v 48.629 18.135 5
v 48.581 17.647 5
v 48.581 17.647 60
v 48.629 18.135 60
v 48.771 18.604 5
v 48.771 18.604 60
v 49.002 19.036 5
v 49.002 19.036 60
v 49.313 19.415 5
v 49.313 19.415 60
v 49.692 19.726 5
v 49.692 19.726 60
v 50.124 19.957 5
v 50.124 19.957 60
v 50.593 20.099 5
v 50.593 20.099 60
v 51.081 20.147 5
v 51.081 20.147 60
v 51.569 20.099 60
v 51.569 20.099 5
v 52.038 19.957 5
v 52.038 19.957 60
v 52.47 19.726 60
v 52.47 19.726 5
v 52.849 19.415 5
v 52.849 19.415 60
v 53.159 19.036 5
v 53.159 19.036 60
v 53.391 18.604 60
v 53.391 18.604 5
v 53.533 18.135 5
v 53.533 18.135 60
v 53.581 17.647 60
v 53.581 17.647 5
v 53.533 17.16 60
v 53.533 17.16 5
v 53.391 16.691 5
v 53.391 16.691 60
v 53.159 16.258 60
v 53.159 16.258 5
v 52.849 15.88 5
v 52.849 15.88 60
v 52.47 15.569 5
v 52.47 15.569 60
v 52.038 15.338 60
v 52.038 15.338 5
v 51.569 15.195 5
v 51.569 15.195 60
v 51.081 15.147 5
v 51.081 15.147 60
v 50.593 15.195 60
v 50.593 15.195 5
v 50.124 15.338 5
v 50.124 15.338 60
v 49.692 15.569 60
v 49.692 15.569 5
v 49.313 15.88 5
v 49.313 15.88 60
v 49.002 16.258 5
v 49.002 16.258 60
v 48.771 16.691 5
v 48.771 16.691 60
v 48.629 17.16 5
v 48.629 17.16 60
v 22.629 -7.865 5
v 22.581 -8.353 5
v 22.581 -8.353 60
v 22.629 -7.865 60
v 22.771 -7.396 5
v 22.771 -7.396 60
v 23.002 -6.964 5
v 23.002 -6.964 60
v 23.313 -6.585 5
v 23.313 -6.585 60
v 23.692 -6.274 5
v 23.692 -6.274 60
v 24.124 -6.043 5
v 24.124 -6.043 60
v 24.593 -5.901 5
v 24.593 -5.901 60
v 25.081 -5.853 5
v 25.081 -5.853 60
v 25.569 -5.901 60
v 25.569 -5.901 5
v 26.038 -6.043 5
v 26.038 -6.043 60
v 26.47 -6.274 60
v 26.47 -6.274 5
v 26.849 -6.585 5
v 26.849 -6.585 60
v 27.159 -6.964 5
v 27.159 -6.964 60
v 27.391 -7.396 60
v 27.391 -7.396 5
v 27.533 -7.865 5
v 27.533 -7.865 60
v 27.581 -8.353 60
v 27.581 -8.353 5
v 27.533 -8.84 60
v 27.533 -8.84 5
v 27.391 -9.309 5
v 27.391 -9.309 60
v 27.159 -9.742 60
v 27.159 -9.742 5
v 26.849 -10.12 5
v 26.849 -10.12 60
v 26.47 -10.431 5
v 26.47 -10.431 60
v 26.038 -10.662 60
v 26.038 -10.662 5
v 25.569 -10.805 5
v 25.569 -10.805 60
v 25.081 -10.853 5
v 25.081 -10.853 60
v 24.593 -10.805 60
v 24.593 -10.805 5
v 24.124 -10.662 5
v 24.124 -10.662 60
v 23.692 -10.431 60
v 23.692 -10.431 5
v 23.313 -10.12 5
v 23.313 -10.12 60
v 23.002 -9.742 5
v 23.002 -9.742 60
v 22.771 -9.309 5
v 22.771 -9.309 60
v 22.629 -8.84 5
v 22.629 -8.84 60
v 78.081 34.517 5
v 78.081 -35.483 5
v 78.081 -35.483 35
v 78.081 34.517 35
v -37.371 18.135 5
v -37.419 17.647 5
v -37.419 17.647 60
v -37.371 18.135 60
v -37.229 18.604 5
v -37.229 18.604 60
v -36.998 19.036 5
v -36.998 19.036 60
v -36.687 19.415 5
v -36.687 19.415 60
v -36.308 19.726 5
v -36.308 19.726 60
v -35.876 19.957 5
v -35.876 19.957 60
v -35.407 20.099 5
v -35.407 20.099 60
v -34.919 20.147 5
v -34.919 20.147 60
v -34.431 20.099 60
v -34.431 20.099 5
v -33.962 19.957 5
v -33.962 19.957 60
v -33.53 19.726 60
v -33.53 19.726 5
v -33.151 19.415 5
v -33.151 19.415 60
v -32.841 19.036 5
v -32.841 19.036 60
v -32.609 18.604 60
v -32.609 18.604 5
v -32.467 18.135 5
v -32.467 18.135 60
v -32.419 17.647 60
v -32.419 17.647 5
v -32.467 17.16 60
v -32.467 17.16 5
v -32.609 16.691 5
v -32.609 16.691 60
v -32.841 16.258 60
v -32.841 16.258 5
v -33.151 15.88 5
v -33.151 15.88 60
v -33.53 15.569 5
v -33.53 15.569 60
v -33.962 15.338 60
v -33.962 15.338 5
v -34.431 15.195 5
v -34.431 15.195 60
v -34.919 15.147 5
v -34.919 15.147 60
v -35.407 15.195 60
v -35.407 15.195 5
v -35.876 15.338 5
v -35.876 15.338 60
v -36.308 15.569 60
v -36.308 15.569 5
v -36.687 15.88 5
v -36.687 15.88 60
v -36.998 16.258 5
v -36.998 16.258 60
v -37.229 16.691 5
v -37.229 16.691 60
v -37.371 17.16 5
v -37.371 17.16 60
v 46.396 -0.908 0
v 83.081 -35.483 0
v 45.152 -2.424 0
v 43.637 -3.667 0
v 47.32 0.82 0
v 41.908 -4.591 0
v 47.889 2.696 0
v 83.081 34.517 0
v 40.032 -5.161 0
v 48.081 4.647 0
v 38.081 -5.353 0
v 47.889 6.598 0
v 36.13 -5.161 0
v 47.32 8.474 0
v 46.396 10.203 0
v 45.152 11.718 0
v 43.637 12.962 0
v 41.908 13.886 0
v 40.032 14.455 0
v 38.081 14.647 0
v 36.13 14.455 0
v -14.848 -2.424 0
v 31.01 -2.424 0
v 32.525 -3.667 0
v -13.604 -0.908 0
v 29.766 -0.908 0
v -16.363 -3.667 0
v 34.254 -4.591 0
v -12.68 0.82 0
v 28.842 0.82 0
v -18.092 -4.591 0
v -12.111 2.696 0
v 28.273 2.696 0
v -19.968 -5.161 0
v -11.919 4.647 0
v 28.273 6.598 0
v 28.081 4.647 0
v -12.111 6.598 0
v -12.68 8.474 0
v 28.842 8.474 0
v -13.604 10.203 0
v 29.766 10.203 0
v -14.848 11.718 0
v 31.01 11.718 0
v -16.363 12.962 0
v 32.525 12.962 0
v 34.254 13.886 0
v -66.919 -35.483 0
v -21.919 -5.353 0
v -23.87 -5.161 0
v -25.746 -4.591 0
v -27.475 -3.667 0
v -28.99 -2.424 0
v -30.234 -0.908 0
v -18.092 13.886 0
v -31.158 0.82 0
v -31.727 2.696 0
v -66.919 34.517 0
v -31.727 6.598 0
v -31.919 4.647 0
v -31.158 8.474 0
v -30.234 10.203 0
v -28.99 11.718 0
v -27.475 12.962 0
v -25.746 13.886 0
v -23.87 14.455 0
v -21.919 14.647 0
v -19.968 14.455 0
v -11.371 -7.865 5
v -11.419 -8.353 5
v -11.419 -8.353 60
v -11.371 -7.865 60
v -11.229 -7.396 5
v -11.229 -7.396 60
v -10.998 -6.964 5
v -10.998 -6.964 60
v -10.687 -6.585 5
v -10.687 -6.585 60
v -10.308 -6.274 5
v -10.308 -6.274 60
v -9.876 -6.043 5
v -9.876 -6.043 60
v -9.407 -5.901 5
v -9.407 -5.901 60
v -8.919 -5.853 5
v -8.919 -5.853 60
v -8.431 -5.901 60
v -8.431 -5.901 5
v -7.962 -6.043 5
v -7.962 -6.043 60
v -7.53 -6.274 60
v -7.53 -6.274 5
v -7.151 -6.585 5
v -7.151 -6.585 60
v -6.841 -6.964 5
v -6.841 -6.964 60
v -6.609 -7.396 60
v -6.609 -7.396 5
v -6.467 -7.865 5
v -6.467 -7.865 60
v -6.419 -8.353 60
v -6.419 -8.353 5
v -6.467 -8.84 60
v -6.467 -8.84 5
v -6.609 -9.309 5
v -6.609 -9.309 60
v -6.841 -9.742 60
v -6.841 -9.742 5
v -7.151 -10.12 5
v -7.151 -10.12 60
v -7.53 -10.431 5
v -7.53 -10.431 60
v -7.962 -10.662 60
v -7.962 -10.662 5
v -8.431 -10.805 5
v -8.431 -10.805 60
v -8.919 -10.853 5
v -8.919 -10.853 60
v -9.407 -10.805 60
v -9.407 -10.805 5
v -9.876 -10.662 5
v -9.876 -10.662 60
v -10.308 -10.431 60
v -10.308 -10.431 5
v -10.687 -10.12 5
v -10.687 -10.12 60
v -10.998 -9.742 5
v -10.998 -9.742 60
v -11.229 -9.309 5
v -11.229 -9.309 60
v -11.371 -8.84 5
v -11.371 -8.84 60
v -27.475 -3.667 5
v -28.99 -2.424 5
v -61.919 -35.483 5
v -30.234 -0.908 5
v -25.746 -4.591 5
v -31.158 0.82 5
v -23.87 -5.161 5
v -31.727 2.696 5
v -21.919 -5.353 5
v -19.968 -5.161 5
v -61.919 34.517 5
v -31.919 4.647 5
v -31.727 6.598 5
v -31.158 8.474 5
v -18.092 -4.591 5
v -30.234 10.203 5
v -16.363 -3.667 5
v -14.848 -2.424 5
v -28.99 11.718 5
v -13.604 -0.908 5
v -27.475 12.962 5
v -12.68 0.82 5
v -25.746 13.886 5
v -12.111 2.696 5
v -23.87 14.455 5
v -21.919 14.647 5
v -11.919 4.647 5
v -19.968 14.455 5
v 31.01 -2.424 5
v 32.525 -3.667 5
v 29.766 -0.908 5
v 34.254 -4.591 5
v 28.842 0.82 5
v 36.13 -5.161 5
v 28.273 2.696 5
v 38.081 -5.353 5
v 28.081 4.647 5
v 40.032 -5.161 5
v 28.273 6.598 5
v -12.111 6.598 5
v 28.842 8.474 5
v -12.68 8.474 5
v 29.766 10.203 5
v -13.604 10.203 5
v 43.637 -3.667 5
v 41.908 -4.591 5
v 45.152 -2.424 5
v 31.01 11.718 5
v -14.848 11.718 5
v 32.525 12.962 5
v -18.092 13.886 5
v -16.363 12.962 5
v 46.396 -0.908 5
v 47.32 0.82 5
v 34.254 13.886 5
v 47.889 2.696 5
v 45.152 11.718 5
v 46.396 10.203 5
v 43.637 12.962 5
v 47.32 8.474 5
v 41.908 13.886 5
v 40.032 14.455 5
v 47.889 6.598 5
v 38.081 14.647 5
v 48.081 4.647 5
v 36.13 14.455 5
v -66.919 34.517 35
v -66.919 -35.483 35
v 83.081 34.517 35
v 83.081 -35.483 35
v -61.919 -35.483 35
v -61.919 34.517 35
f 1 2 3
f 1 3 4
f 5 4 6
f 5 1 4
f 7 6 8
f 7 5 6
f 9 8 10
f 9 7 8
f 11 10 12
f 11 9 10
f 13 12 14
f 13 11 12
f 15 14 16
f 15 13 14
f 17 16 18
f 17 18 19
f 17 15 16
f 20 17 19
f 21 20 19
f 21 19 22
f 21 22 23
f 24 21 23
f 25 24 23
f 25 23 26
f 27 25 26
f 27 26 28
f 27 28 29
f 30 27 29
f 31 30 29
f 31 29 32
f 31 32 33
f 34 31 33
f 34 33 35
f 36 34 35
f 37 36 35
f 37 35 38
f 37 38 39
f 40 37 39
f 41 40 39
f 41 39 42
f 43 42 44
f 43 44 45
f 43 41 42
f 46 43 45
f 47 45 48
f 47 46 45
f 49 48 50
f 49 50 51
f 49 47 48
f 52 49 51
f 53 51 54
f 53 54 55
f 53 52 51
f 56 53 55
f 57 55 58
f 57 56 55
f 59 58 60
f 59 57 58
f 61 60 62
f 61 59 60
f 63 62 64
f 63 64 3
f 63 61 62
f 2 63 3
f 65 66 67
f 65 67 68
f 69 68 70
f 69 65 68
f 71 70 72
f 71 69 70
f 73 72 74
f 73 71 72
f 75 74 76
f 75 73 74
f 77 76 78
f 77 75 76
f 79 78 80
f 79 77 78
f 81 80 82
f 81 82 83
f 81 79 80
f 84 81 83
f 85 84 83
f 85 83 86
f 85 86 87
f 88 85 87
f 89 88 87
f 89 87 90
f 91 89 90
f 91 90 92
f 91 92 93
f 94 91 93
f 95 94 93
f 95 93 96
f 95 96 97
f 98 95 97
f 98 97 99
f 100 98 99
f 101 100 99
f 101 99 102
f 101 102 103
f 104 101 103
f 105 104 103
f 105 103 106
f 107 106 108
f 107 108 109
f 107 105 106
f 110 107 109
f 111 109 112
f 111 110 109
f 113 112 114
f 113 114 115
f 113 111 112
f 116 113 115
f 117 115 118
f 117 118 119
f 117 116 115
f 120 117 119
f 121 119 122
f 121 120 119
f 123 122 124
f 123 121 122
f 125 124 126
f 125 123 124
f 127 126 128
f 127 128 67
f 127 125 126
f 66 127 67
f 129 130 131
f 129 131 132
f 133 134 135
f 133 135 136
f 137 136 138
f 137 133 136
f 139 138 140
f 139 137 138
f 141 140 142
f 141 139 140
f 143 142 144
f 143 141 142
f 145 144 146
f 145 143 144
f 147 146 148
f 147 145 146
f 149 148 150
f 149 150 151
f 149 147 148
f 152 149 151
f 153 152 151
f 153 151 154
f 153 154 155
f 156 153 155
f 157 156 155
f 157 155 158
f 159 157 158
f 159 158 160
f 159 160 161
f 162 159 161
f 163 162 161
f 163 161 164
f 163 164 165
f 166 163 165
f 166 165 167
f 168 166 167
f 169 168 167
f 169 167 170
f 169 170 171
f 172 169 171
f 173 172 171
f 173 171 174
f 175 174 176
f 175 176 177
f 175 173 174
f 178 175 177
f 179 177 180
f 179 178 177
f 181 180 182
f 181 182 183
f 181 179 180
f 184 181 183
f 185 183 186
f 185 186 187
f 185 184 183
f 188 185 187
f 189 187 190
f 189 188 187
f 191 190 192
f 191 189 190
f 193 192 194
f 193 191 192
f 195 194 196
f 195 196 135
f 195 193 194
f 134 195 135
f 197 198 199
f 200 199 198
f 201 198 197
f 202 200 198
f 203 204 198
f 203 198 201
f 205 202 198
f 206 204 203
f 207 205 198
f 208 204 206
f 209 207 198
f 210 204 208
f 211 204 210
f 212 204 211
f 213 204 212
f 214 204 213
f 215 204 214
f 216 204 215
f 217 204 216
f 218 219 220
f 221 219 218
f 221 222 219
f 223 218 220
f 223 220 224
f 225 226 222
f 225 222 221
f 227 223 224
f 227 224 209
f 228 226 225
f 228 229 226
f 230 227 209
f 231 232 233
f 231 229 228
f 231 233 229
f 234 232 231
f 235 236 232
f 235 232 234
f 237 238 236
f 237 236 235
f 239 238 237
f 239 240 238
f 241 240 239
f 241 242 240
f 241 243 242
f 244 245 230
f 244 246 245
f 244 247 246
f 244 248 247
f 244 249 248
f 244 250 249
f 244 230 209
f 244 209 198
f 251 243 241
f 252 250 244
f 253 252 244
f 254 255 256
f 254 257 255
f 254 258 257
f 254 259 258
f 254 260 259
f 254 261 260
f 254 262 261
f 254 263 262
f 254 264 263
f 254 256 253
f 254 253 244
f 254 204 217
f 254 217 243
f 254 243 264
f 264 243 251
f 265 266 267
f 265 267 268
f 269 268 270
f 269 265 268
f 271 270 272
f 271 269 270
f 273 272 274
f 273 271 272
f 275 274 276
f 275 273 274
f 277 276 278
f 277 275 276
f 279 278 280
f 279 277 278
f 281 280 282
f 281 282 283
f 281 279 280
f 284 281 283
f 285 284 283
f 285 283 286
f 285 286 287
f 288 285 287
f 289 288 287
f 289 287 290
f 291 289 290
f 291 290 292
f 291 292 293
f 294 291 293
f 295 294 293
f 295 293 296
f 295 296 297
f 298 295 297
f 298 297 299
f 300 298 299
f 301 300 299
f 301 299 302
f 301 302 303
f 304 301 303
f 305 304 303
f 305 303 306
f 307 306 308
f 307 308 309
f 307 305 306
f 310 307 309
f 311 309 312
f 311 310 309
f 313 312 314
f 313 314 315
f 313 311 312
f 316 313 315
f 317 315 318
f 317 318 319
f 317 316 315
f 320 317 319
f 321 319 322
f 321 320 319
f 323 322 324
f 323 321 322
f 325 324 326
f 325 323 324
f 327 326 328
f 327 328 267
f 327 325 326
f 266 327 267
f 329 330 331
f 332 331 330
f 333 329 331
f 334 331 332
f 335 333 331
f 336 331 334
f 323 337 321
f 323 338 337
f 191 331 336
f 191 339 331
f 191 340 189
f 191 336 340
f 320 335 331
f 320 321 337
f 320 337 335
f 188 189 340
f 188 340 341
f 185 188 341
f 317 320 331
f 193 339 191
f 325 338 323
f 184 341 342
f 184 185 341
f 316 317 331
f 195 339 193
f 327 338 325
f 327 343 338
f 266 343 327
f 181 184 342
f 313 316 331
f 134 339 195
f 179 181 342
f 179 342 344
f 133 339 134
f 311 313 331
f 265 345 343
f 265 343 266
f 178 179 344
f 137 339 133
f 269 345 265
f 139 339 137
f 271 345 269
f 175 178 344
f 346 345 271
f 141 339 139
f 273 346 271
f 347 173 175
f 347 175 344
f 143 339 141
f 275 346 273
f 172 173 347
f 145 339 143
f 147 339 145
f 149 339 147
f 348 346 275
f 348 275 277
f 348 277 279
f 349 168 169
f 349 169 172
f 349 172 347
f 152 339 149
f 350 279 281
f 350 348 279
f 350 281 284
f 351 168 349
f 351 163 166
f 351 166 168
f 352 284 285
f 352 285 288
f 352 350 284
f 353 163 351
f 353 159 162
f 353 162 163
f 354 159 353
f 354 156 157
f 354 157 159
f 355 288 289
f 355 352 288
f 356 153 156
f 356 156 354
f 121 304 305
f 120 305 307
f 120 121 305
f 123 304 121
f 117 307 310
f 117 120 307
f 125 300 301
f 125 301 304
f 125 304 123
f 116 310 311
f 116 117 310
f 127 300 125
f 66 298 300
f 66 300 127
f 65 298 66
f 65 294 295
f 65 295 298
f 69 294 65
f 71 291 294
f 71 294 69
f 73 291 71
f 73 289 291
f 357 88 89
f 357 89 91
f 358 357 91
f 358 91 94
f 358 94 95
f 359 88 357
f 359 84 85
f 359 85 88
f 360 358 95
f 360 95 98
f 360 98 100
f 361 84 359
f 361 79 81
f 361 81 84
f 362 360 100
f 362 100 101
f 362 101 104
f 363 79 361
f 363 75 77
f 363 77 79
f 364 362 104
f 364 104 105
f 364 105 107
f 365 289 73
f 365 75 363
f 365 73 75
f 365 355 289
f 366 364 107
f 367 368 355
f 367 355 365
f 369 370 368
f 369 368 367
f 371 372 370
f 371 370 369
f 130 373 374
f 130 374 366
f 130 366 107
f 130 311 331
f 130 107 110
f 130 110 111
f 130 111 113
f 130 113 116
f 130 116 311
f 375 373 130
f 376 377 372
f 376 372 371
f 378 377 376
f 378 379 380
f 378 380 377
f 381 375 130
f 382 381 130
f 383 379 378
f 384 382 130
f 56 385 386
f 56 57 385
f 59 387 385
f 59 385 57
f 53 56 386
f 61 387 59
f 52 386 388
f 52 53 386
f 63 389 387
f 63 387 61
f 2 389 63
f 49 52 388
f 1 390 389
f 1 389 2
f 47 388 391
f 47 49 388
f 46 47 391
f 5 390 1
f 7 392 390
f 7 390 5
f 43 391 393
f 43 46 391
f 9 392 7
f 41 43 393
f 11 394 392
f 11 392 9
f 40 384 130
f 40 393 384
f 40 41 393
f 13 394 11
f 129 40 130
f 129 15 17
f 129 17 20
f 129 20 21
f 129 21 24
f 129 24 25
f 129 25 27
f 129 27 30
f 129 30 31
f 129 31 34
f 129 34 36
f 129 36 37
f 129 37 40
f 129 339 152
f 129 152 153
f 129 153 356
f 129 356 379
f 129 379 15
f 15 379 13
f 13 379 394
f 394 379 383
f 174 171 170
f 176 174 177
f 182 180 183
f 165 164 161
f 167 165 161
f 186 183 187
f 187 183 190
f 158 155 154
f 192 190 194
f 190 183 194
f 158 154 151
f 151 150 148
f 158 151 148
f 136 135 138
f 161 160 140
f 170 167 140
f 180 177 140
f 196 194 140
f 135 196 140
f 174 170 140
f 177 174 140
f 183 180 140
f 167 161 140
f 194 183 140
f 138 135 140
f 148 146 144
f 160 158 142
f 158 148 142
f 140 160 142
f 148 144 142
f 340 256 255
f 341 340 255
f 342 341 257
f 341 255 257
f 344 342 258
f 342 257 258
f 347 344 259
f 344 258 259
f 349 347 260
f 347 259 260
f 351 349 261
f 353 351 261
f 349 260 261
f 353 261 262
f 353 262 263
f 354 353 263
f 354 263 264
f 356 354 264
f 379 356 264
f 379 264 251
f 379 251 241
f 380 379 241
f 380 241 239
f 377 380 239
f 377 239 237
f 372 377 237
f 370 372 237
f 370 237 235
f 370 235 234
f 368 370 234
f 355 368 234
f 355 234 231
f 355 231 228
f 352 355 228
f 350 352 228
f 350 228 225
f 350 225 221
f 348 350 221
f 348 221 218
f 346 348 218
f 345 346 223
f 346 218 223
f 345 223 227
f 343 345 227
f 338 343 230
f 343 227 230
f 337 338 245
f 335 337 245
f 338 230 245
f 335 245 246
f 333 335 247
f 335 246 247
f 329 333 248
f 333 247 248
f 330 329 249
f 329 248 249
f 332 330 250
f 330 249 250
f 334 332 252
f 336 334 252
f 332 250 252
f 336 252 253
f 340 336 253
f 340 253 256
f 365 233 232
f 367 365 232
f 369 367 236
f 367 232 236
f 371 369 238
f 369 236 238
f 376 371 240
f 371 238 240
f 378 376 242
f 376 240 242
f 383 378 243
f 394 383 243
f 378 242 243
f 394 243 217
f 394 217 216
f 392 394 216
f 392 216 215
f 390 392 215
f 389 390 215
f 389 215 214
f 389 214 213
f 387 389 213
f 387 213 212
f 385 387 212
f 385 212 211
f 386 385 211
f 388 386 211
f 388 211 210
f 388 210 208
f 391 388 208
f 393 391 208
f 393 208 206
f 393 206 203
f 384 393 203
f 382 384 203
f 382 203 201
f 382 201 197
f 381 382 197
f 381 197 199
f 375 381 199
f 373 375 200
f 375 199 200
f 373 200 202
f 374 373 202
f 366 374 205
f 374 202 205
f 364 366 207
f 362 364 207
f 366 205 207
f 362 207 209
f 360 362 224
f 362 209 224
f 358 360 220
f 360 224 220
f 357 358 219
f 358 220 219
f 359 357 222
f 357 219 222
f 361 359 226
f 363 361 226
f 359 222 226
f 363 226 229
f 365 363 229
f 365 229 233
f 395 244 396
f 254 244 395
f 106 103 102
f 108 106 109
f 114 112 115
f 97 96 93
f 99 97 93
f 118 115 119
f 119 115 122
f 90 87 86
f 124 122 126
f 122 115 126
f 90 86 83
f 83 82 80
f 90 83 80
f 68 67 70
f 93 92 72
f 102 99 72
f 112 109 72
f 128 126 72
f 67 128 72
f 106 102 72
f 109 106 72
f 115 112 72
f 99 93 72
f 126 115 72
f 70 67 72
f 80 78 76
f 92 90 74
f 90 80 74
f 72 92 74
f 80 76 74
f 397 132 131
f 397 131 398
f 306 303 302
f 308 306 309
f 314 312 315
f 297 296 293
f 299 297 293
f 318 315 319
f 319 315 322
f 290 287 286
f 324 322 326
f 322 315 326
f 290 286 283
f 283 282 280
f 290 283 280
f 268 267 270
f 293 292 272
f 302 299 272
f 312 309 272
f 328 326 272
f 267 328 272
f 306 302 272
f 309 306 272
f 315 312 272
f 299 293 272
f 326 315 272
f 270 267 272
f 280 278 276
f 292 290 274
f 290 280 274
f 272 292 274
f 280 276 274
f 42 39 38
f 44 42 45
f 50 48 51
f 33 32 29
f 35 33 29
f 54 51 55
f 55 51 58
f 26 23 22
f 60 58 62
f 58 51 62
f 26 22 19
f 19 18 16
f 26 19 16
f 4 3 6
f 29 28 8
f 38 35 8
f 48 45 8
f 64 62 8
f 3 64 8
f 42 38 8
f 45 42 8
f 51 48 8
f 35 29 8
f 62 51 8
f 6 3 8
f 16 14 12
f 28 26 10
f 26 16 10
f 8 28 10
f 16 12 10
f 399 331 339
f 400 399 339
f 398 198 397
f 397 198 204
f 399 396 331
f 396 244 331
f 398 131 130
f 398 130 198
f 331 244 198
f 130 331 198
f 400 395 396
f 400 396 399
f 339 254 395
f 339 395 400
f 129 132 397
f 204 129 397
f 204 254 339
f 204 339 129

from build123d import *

# Parameters (mm, degrees)
ESQUISSE1_W             = 150
ESQUISSE1_H             = 70
BOSS_EXTRU_1_DEPTH      = 5
ESQUISSE2_W             = 5
ESQUISSE2_H             = 70
BOSS_EXTRU_2_DEPTH      = 30
ESQUISSE3_R             = 10
ENL_V_MAT_EXTRU_1_DEPTH = 30
ESQUISSE5_R             = 2.5
BOSS_EXTRU_3_DEPTH      = 60


with BuildPart() as part:
    # Esquisse1 → Boss.-Extru.1 (new body)
    with BuildSketch(Plane.XY):
        with Locations((8.080821687, -0.482695652)):
            Rectangle(ESQUISSE1_W, ESQUISSE1_H)
    extrude(amount=BOSS_EXTRU_1_DEPTH)

    # Esquisse2 → Boss.-Extru.2 (add)
    with BuildSketch(Plane.XY.offset(5)):
        with Locations((-64.419178313, -0.482695652)):
            Rectangle(ESQUISSE2_W, ESQUISSE2_H)
        with Locations((80.580821687, -0.482695652)):
            Rectangle(ESQUISSE2_W, ESQUISSE2_H)
    extrude(amount=BOSS_EXTRU_2_DEPTH)

    # Esquisse3 → Enlèv. mat.-Extru.1 (cut)
    with BuildSketch(Plane(origin=(0, 0, 0), x_dir=(-1, 0, 0), z_dir=(0, 0, -1))):
        with Locations((21.919178313, 4.647304348)):
            Circle(ESQUISSE3_R)
        with Locations((-38.080821687, 4.647304348)):
            Circle(ESQUISSE3_R)
    extrude(amount=-ENL_V_MAT_EXTRU_1_DEPTH, mode=Mode.SUBTRACT)

    # Esquisse5 → Boss.-Extru.3 (add)
    with BuildSketch(Plane(origin=(0, 0, 0), x_dir=(-1, 0, 0), z_dir=(0, 0, -1))):
        with Locations((34.919178313, 17.647304348)):
            Circle(ESQUISSE5_R)
        with Locations((8.919178313, -8.352695652)):
            Circle(ESQUISSE5_R)
        with Locations((-51.080821687, 17.647304348)):
            Circle(ESQUISSE5_R)
        with Locations((-25.080821687, -8.352695652)):
            Circle(ESQUISSE5_R)
    extrude(amount=-BOSS_EXTRU_3_DEPTH)


solid = part.part
